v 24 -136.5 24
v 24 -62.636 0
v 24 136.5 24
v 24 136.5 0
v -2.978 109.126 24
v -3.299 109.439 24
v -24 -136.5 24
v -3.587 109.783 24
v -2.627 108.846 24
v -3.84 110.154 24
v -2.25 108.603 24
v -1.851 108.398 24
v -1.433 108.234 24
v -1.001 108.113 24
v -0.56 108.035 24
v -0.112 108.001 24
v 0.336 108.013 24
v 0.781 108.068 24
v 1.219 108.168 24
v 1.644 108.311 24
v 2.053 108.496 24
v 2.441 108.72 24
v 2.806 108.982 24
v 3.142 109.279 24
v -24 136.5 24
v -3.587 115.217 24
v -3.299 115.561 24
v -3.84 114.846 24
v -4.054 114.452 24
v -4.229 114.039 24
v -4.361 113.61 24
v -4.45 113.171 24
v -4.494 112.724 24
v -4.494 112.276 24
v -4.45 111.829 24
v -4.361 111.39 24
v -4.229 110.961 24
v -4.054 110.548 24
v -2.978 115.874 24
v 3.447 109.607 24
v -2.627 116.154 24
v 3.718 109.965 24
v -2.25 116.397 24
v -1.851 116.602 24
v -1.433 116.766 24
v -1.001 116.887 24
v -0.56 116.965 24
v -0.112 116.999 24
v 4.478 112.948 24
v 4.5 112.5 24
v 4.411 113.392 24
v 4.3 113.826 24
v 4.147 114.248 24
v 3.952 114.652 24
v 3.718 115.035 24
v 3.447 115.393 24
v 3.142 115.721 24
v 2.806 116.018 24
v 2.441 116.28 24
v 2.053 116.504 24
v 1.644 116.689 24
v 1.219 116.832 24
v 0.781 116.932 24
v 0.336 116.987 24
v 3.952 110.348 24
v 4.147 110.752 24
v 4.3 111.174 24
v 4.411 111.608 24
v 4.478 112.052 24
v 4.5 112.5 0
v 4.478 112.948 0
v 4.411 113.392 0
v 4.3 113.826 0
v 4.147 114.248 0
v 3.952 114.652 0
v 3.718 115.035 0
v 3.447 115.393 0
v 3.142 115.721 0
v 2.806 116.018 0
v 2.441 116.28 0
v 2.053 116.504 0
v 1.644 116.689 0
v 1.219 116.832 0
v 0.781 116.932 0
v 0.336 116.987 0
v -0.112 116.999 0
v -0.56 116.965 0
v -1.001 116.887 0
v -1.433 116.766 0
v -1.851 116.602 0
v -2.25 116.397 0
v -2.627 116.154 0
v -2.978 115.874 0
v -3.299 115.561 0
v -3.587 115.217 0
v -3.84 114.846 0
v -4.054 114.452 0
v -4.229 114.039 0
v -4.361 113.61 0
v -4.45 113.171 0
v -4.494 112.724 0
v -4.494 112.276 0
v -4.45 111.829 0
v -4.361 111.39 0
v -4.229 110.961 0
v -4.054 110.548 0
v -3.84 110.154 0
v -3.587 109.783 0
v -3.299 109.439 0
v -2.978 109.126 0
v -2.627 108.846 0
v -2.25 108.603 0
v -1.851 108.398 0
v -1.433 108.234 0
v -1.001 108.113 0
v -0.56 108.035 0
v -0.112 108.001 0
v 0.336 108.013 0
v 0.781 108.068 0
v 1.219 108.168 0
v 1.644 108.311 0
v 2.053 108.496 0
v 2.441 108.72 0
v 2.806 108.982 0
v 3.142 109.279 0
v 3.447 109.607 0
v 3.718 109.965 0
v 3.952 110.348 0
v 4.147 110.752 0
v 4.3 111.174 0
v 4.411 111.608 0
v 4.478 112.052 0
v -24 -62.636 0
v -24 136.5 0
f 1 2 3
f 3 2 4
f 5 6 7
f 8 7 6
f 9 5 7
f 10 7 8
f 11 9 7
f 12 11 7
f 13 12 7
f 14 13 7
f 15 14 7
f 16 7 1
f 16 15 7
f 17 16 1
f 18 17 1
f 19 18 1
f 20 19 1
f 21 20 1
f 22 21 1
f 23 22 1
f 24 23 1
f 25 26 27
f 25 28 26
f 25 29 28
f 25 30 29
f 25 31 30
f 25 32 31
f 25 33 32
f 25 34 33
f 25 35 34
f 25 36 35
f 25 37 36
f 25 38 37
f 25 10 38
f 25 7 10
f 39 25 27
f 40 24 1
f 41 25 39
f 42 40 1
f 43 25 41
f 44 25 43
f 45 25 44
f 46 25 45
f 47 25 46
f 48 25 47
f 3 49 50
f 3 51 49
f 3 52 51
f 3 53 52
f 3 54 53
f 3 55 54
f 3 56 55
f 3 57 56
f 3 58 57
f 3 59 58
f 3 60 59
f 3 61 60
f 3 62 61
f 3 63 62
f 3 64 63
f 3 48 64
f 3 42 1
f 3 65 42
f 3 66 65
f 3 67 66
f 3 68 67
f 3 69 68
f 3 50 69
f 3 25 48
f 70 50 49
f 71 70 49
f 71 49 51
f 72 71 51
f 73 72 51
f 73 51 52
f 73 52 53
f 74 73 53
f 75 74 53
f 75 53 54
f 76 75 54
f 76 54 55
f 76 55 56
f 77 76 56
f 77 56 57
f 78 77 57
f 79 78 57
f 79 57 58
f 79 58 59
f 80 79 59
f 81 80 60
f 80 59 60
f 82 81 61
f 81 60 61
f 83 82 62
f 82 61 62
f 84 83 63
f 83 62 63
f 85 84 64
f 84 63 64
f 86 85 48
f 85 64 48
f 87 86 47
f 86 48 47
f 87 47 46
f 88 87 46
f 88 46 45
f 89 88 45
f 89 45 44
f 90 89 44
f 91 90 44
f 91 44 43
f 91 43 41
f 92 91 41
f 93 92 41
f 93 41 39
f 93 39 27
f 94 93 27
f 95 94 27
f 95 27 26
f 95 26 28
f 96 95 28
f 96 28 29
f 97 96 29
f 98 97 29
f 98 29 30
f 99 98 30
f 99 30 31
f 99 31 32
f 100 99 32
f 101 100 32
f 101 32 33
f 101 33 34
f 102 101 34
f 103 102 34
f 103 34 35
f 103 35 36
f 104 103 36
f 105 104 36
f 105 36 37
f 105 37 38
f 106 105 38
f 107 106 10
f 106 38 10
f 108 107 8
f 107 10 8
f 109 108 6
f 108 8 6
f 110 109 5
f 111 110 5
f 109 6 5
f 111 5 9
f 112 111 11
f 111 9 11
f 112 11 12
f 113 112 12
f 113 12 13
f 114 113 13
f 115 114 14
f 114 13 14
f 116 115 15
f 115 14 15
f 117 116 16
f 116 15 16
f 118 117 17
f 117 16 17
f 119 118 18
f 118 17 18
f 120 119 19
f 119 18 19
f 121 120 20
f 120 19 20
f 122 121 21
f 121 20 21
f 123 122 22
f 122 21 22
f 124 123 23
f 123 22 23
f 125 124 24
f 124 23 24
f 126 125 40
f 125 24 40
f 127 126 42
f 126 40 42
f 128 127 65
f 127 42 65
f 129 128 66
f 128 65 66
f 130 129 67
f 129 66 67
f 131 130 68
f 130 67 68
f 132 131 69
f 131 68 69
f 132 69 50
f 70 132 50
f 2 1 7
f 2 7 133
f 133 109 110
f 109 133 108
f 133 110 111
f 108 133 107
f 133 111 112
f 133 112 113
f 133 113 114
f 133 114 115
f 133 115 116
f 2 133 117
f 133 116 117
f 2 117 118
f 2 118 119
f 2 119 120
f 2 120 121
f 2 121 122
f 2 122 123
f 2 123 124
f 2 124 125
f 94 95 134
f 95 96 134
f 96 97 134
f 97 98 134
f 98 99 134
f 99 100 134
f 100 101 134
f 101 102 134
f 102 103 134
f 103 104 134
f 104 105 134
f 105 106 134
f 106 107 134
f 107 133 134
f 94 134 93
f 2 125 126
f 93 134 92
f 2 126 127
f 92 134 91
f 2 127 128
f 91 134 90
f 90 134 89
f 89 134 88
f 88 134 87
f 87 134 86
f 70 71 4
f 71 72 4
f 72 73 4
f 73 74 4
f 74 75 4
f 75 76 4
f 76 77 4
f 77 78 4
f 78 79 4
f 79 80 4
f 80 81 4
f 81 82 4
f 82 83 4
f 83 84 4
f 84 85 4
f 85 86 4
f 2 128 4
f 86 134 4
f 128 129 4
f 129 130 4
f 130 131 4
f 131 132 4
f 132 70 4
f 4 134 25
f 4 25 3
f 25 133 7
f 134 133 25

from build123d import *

# Parameters (mm, degrees)
ESQUISSE1_W             = 48
ESQUISSE1_H             = 273
BOSS_EXTRU_1_DEPTH      = 24
ENL_V_MAT_EXTRU_1_DEPTH = 147.670549191
ESQUISSE5_R             = 4.5
ENL_V_MAT_EXTRU_2_DEPTH = 141.656496473


with BuildPart() as part:
    # Esquisse1 → Boss.-Extru.1 (new body)
    with BuildSketch(Plane.XY):
        Rectangle(ESQUISSE1_W, ESQUISSE1_H)
    extrude(amount=BOSS_EXTRU_1_DEPTH)

    # Esquisse4 → Enlèv. mat.-Extru.1 (cut, through all)
    with BuildSketch(Plane(origin=(24, 0, 0), x_dir=(0, 0, -1), z_dir=(1, 0, 0))):
        Polygon((-24, -136.5), (0, -62.635595108), (0, -136.5), align=None)
    extrude(amount=-ENL_V_MAT_EXTRU_1_DEPTH, mode=Mode.SUBTRACT)

    # Esquisse5 → Enlèv. mat.-Extru.2 (cut, through all)
    with BuildSketch(Plane.XY.offset(24)):
        with Locations((0, 112.5)):
            Circle(ESQUISSE5_R)
    extrude(amount=-ENL_V_MAT_EXTRU_2_DEPTH, mode=Mode.SUBTRACT)


solid = part.part
